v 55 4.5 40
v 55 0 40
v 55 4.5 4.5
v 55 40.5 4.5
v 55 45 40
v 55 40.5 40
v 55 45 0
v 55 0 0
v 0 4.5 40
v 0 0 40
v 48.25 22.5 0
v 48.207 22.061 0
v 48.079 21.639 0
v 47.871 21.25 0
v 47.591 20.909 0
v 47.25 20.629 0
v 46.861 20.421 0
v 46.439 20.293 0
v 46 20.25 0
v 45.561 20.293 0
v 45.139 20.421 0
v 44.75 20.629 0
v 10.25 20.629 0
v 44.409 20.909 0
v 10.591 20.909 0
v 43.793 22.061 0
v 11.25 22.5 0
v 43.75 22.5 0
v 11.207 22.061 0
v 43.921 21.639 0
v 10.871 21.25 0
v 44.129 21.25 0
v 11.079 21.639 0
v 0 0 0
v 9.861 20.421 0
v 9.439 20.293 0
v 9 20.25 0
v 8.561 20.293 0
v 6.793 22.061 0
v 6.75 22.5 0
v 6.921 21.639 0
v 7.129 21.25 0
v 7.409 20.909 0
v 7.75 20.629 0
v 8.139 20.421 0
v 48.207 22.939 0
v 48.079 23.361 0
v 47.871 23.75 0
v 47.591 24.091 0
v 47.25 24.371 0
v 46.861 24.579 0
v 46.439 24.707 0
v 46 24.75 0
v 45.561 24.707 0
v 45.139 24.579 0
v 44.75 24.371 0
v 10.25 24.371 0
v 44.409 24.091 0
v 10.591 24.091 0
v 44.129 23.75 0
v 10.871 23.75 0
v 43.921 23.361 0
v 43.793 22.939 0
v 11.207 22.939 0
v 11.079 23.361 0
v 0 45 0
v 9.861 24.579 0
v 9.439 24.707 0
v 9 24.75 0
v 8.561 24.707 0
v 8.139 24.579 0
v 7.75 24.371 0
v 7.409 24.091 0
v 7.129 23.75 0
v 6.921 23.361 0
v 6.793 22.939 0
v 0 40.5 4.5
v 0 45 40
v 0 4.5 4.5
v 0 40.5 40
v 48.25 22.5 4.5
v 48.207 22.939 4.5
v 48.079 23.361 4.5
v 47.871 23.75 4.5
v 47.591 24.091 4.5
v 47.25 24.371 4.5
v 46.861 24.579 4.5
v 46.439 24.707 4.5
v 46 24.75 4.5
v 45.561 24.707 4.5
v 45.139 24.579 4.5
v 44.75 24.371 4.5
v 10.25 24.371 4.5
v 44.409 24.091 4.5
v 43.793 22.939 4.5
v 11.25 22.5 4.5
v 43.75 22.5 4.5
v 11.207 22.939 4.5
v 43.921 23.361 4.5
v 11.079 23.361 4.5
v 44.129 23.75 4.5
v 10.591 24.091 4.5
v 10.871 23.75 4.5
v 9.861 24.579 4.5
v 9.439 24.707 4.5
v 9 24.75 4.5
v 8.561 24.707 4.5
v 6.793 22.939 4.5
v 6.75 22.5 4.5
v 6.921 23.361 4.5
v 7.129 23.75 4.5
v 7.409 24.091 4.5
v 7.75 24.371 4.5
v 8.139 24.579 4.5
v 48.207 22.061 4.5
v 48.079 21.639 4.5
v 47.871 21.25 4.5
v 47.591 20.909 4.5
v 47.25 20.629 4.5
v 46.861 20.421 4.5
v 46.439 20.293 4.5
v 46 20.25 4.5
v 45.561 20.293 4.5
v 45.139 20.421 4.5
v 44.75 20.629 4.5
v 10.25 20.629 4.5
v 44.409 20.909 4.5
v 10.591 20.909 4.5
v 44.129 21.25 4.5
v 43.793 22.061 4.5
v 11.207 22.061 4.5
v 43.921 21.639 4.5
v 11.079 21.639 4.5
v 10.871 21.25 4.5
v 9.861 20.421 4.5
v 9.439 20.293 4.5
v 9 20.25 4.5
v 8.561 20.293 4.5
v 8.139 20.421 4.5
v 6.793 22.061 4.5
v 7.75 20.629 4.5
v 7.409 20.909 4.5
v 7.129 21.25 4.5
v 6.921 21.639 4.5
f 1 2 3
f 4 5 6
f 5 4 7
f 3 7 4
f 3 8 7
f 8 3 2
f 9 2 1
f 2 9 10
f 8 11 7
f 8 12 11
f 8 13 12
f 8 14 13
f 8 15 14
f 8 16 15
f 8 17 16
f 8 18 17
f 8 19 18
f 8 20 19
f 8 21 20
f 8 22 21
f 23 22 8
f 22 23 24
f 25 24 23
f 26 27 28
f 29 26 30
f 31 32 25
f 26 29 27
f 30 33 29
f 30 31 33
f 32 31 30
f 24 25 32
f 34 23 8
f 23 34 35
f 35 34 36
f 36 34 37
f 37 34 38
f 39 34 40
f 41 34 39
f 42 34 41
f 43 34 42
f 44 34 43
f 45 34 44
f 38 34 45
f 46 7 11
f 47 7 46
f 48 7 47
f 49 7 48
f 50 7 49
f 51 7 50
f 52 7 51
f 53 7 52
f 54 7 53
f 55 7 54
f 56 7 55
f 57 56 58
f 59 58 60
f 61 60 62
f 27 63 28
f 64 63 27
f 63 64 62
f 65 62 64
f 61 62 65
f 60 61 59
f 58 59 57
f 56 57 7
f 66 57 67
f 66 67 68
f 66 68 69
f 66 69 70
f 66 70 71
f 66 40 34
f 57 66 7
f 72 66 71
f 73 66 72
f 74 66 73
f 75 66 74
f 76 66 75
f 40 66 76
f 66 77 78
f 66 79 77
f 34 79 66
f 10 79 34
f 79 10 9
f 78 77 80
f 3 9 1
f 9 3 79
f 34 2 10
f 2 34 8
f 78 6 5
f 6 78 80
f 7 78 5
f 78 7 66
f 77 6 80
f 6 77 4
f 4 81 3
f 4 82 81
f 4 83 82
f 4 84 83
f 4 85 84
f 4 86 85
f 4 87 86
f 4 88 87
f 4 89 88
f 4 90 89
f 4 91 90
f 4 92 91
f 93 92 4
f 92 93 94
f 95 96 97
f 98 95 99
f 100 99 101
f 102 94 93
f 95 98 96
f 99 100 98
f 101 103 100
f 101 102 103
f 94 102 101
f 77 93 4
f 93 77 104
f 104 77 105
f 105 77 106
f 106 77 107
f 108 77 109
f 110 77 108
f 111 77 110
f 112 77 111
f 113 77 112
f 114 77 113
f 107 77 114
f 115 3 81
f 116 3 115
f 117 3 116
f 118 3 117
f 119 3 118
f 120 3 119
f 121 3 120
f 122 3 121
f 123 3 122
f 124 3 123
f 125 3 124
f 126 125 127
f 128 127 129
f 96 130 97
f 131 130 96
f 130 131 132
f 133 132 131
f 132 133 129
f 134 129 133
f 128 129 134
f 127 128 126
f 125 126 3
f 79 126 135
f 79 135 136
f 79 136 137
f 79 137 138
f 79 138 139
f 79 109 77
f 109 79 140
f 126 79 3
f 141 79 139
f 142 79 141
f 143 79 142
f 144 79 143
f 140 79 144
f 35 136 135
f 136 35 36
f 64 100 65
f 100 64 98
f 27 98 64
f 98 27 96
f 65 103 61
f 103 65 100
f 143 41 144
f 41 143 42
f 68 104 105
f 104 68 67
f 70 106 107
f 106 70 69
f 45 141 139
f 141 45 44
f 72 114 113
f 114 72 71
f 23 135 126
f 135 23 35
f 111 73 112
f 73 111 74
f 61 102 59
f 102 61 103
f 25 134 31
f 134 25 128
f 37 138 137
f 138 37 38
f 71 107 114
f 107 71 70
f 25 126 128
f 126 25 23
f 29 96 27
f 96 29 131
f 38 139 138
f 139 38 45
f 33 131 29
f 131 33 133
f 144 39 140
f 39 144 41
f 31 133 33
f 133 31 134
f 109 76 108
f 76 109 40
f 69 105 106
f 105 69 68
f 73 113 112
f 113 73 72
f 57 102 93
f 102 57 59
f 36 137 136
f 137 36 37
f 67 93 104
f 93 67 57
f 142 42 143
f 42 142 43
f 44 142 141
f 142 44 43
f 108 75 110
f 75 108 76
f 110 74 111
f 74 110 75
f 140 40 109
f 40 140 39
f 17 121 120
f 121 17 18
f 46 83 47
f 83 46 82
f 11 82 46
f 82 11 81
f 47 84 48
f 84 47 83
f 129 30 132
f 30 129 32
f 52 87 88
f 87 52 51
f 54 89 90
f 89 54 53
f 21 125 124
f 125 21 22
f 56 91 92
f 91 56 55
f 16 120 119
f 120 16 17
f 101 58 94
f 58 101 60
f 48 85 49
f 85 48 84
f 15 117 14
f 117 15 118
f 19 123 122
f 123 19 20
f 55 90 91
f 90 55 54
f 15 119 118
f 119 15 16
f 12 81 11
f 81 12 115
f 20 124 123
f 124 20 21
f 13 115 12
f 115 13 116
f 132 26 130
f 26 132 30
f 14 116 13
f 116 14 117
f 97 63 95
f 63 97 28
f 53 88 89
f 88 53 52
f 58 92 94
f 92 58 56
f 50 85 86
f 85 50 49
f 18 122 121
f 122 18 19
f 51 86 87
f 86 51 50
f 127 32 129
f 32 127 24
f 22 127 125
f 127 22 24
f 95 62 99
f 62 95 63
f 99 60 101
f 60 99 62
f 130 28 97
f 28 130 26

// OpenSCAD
$fn = 32;

// ----------------------------------------------------------------------
// U-bracket: 55 x 45 x 40 mm
// ----------------------------------------------------------------------

// --- parameters (mm) ---
span = 55;                // outer length, X
outer_w = 45;             // outer width, Y
wall_h = 40;              // upright height, Z
plate_t = 4.5;            // wall thickness
hole_d = 4.5;             // clearance for M4

module hole_z(px, py) {
  translate([px, py, -0.5]) cylinder(h = plate_t + 1, d = hole_d);
}
module hole_y_pz(pz) {
  /* through both uprights along Y */
  translate([0, -0.5, pz]) rotate([-90, 0, 0]) cylinder(h = outer_w + 1, d = hole_d);
}

module base() {
  cube([span, outer_w, plate_t]);
}

module uprights() {
  cube([span, plate_t, wall_h]);
  translate([0, outer_w - plate_t, 0]) cube([span, plate_t, wall_h]);
}

difference() {
  union() {
    base();
    uprights();
  }
  hole_z(9, 22.5);
  hole_z(46, 22.5);
}
